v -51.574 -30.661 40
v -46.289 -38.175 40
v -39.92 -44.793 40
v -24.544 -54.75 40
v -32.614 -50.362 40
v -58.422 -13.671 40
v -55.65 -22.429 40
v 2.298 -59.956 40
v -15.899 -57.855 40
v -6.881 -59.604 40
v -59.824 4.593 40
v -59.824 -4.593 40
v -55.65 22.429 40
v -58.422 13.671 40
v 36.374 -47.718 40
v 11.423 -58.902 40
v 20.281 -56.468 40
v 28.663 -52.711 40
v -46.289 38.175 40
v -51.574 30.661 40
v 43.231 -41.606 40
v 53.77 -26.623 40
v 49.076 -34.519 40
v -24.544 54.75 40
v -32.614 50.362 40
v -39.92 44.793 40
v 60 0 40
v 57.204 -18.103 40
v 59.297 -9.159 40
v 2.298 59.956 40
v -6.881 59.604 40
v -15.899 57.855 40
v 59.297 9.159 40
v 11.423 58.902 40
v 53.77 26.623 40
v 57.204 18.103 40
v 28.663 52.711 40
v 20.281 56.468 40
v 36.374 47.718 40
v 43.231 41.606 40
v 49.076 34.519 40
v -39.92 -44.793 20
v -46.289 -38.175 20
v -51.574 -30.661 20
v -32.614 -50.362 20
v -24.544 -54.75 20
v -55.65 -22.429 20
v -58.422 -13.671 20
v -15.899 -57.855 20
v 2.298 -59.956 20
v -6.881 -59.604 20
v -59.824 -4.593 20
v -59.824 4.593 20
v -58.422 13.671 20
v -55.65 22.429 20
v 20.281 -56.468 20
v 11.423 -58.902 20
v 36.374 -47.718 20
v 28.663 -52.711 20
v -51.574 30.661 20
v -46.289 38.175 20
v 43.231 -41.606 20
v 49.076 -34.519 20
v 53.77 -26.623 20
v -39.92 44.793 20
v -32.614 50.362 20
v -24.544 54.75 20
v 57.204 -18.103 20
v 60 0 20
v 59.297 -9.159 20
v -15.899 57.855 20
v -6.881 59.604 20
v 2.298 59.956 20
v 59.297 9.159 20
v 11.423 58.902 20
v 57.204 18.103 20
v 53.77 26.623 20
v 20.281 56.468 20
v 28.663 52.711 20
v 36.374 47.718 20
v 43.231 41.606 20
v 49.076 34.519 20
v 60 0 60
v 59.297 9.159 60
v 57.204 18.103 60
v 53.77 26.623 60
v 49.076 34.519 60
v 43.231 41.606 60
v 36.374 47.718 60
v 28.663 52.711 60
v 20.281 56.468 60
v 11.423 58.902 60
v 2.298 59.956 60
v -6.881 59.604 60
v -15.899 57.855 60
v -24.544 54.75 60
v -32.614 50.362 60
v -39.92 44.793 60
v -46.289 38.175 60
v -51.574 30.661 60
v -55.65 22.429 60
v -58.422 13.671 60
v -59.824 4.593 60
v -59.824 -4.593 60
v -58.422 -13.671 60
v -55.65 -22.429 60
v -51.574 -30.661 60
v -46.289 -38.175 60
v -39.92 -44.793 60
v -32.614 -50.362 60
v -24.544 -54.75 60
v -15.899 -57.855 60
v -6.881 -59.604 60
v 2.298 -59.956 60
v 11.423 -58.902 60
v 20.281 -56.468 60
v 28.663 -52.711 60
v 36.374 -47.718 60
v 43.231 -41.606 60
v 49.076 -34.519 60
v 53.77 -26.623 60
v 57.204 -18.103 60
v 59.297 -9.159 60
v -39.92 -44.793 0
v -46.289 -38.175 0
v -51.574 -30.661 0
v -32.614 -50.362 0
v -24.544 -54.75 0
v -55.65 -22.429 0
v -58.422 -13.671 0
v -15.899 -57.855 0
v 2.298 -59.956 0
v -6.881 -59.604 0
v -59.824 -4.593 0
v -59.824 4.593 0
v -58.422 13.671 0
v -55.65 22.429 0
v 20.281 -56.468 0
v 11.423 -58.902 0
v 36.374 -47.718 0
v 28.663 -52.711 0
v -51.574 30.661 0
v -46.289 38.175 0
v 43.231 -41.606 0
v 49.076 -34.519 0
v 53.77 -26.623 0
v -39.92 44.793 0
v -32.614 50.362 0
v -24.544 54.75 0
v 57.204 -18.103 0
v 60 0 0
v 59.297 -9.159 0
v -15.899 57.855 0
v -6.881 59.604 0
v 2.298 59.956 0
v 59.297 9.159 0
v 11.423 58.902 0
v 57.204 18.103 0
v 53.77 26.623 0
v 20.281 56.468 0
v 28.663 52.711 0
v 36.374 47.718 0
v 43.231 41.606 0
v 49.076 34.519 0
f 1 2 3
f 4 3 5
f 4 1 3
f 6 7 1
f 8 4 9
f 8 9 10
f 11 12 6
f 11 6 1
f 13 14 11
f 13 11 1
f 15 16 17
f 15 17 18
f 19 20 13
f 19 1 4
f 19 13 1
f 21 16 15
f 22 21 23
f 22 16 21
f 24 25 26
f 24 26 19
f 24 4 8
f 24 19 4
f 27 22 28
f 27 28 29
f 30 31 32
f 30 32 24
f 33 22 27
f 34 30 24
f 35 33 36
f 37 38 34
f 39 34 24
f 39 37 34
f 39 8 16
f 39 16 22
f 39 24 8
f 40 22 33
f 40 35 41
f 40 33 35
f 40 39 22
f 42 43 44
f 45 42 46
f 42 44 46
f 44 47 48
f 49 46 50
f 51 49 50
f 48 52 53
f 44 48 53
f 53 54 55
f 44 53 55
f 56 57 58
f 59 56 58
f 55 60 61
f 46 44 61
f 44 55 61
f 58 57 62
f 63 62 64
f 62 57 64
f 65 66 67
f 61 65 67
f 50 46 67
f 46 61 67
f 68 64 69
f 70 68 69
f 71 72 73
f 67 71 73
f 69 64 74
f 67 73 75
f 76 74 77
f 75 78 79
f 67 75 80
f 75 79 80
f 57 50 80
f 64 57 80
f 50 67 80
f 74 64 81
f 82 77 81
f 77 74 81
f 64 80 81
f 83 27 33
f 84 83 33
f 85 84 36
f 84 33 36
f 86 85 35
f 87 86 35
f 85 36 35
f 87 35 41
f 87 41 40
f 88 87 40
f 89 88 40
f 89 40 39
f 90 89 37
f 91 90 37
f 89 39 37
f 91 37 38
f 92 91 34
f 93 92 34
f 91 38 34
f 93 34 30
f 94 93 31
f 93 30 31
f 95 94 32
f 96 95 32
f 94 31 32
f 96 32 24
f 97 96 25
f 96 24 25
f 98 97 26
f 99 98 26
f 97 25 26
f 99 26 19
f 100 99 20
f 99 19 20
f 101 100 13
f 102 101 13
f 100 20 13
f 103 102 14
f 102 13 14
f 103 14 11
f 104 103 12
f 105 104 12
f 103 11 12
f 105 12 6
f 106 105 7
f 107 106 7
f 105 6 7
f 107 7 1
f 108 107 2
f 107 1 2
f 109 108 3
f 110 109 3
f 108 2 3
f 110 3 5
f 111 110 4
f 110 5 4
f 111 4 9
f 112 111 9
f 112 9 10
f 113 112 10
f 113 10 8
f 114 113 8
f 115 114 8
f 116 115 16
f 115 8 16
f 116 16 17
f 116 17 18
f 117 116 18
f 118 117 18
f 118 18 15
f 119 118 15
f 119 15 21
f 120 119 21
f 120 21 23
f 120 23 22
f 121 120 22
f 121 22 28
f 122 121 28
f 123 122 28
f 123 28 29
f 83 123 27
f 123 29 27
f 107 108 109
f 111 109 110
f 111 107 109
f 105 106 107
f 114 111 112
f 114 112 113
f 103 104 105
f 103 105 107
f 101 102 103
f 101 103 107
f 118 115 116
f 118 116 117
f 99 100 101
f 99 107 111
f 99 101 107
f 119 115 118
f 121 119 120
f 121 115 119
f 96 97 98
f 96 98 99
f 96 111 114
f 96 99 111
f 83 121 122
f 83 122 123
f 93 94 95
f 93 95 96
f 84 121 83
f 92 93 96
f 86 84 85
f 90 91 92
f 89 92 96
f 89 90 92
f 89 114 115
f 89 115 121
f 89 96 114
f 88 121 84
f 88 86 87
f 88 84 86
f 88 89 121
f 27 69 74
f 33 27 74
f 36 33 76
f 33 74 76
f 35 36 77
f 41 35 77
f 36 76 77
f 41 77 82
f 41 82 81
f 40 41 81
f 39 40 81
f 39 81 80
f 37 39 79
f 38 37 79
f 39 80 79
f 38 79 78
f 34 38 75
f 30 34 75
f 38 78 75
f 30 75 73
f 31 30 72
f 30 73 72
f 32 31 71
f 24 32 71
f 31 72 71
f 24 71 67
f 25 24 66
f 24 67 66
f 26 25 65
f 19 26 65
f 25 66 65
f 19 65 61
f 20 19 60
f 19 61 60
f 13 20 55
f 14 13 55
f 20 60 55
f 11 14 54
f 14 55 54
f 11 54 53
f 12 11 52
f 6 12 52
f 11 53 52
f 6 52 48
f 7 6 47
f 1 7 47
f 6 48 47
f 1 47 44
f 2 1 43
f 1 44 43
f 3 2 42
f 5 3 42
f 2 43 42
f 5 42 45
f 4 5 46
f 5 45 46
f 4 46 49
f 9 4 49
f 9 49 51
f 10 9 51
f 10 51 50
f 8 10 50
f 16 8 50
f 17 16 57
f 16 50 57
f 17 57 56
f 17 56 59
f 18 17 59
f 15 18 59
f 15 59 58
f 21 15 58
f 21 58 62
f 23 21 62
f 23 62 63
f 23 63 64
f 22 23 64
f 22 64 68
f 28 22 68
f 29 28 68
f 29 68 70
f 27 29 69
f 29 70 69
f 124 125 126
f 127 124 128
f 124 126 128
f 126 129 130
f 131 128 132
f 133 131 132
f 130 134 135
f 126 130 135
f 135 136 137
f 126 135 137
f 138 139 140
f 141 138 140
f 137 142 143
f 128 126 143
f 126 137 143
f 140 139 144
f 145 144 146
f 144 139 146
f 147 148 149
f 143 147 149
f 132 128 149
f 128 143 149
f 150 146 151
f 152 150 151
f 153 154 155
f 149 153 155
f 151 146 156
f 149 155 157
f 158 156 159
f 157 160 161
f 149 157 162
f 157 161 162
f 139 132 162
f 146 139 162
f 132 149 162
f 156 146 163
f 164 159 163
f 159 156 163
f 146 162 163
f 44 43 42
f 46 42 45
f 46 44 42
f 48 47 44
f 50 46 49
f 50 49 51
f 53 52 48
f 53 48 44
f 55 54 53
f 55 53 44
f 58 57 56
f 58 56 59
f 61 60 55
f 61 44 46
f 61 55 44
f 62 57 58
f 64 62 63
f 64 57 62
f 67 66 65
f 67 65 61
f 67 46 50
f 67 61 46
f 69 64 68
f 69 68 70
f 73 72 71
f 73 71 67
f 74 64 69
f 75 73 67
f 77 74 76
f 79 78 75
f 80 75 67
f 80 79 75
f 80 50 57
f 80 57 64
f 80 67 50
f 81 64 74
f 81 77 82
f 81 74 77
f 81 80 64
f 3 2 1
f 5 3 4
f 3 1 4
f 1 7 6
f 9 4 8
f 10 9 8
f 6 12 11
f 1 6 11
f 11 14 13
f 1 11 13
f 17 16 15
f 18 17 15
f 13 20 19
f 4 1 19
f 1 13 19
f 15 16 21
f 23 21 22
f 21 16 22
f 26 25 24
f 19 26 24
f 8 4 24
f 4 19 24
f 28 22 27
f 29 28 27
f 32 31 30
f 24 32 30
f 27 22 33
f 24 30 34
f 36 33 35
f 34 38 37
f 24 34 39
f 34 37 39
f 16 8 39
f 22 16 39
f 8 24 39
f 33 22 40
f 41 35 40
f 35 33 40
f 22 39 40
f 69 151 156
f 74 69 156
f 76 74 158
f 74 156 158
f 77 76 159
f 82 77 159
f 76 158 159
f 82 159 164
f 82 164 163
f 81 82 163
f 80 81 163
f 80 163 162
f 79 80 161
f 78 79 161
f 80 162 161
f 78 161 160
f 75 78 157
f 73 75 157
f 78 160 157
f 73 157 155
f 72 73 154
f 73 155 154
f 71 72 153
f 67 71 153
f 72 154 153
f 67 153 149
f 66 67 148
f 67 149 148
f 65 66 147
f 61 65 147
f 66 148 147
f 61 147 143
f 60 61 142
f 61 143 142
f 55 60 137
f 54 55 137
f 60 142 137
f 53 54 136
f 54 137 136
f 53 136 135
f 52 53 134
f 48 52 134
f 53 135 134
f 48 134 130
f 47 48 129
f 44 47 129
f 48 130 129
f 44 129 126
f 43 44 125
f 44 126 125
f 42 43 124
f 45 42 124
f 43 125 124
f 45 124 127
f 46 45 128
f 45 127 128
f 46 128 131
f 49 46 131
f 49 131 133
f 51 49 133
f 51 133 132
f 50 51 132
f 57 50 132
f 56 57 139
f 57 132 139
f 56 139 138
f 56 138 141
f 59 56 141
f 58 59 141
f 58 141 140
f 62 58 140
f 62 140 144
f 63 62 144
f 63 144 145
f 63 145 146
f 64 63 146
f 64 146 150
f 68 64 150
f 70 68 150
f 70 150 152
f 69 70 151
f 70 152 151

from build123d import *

# Parameters (mm, degrees)
SKETCH1_R           = 60
BOSS_EXTRUDE1_DEPTH = 20
SKETCH2_R           = 60
BOSS_EXTRUDE2_DEPTH = 20
SKETCH3_R           = 60
BOSS_EXTRUDE3_DEPTH = 20


with BuildPart() as part:
    # Sketch1 → Boss-Extrude1 (new body)
    with BuildSketch(Plane.XY):
        Circle(SKETCH1_R)
    extrude(amount=BOSS_EXTRUDE1_DEPTH)


with BuildPart() as body_2:
    # Sketch2 → Boss-Extrude2 (new body)
    with BuildSketch(Plane.XY.offset(20)):
        Circle(SKETCH2_R)
    extrude(amount=BOSS_EXTRUDE2_DEPTH)


with BuildPart() as body_3:
    # Sketch3 → Boss-Extrude3 (new body)
    with BuildSketch(Plane.XY.offset(40)):
        Circle(SKETCH3_R)
    extrude(amount=BOSS_EXTRUDE3_DEPTH)


solid = Compound([part.part, body_2.part, body_3.part])
